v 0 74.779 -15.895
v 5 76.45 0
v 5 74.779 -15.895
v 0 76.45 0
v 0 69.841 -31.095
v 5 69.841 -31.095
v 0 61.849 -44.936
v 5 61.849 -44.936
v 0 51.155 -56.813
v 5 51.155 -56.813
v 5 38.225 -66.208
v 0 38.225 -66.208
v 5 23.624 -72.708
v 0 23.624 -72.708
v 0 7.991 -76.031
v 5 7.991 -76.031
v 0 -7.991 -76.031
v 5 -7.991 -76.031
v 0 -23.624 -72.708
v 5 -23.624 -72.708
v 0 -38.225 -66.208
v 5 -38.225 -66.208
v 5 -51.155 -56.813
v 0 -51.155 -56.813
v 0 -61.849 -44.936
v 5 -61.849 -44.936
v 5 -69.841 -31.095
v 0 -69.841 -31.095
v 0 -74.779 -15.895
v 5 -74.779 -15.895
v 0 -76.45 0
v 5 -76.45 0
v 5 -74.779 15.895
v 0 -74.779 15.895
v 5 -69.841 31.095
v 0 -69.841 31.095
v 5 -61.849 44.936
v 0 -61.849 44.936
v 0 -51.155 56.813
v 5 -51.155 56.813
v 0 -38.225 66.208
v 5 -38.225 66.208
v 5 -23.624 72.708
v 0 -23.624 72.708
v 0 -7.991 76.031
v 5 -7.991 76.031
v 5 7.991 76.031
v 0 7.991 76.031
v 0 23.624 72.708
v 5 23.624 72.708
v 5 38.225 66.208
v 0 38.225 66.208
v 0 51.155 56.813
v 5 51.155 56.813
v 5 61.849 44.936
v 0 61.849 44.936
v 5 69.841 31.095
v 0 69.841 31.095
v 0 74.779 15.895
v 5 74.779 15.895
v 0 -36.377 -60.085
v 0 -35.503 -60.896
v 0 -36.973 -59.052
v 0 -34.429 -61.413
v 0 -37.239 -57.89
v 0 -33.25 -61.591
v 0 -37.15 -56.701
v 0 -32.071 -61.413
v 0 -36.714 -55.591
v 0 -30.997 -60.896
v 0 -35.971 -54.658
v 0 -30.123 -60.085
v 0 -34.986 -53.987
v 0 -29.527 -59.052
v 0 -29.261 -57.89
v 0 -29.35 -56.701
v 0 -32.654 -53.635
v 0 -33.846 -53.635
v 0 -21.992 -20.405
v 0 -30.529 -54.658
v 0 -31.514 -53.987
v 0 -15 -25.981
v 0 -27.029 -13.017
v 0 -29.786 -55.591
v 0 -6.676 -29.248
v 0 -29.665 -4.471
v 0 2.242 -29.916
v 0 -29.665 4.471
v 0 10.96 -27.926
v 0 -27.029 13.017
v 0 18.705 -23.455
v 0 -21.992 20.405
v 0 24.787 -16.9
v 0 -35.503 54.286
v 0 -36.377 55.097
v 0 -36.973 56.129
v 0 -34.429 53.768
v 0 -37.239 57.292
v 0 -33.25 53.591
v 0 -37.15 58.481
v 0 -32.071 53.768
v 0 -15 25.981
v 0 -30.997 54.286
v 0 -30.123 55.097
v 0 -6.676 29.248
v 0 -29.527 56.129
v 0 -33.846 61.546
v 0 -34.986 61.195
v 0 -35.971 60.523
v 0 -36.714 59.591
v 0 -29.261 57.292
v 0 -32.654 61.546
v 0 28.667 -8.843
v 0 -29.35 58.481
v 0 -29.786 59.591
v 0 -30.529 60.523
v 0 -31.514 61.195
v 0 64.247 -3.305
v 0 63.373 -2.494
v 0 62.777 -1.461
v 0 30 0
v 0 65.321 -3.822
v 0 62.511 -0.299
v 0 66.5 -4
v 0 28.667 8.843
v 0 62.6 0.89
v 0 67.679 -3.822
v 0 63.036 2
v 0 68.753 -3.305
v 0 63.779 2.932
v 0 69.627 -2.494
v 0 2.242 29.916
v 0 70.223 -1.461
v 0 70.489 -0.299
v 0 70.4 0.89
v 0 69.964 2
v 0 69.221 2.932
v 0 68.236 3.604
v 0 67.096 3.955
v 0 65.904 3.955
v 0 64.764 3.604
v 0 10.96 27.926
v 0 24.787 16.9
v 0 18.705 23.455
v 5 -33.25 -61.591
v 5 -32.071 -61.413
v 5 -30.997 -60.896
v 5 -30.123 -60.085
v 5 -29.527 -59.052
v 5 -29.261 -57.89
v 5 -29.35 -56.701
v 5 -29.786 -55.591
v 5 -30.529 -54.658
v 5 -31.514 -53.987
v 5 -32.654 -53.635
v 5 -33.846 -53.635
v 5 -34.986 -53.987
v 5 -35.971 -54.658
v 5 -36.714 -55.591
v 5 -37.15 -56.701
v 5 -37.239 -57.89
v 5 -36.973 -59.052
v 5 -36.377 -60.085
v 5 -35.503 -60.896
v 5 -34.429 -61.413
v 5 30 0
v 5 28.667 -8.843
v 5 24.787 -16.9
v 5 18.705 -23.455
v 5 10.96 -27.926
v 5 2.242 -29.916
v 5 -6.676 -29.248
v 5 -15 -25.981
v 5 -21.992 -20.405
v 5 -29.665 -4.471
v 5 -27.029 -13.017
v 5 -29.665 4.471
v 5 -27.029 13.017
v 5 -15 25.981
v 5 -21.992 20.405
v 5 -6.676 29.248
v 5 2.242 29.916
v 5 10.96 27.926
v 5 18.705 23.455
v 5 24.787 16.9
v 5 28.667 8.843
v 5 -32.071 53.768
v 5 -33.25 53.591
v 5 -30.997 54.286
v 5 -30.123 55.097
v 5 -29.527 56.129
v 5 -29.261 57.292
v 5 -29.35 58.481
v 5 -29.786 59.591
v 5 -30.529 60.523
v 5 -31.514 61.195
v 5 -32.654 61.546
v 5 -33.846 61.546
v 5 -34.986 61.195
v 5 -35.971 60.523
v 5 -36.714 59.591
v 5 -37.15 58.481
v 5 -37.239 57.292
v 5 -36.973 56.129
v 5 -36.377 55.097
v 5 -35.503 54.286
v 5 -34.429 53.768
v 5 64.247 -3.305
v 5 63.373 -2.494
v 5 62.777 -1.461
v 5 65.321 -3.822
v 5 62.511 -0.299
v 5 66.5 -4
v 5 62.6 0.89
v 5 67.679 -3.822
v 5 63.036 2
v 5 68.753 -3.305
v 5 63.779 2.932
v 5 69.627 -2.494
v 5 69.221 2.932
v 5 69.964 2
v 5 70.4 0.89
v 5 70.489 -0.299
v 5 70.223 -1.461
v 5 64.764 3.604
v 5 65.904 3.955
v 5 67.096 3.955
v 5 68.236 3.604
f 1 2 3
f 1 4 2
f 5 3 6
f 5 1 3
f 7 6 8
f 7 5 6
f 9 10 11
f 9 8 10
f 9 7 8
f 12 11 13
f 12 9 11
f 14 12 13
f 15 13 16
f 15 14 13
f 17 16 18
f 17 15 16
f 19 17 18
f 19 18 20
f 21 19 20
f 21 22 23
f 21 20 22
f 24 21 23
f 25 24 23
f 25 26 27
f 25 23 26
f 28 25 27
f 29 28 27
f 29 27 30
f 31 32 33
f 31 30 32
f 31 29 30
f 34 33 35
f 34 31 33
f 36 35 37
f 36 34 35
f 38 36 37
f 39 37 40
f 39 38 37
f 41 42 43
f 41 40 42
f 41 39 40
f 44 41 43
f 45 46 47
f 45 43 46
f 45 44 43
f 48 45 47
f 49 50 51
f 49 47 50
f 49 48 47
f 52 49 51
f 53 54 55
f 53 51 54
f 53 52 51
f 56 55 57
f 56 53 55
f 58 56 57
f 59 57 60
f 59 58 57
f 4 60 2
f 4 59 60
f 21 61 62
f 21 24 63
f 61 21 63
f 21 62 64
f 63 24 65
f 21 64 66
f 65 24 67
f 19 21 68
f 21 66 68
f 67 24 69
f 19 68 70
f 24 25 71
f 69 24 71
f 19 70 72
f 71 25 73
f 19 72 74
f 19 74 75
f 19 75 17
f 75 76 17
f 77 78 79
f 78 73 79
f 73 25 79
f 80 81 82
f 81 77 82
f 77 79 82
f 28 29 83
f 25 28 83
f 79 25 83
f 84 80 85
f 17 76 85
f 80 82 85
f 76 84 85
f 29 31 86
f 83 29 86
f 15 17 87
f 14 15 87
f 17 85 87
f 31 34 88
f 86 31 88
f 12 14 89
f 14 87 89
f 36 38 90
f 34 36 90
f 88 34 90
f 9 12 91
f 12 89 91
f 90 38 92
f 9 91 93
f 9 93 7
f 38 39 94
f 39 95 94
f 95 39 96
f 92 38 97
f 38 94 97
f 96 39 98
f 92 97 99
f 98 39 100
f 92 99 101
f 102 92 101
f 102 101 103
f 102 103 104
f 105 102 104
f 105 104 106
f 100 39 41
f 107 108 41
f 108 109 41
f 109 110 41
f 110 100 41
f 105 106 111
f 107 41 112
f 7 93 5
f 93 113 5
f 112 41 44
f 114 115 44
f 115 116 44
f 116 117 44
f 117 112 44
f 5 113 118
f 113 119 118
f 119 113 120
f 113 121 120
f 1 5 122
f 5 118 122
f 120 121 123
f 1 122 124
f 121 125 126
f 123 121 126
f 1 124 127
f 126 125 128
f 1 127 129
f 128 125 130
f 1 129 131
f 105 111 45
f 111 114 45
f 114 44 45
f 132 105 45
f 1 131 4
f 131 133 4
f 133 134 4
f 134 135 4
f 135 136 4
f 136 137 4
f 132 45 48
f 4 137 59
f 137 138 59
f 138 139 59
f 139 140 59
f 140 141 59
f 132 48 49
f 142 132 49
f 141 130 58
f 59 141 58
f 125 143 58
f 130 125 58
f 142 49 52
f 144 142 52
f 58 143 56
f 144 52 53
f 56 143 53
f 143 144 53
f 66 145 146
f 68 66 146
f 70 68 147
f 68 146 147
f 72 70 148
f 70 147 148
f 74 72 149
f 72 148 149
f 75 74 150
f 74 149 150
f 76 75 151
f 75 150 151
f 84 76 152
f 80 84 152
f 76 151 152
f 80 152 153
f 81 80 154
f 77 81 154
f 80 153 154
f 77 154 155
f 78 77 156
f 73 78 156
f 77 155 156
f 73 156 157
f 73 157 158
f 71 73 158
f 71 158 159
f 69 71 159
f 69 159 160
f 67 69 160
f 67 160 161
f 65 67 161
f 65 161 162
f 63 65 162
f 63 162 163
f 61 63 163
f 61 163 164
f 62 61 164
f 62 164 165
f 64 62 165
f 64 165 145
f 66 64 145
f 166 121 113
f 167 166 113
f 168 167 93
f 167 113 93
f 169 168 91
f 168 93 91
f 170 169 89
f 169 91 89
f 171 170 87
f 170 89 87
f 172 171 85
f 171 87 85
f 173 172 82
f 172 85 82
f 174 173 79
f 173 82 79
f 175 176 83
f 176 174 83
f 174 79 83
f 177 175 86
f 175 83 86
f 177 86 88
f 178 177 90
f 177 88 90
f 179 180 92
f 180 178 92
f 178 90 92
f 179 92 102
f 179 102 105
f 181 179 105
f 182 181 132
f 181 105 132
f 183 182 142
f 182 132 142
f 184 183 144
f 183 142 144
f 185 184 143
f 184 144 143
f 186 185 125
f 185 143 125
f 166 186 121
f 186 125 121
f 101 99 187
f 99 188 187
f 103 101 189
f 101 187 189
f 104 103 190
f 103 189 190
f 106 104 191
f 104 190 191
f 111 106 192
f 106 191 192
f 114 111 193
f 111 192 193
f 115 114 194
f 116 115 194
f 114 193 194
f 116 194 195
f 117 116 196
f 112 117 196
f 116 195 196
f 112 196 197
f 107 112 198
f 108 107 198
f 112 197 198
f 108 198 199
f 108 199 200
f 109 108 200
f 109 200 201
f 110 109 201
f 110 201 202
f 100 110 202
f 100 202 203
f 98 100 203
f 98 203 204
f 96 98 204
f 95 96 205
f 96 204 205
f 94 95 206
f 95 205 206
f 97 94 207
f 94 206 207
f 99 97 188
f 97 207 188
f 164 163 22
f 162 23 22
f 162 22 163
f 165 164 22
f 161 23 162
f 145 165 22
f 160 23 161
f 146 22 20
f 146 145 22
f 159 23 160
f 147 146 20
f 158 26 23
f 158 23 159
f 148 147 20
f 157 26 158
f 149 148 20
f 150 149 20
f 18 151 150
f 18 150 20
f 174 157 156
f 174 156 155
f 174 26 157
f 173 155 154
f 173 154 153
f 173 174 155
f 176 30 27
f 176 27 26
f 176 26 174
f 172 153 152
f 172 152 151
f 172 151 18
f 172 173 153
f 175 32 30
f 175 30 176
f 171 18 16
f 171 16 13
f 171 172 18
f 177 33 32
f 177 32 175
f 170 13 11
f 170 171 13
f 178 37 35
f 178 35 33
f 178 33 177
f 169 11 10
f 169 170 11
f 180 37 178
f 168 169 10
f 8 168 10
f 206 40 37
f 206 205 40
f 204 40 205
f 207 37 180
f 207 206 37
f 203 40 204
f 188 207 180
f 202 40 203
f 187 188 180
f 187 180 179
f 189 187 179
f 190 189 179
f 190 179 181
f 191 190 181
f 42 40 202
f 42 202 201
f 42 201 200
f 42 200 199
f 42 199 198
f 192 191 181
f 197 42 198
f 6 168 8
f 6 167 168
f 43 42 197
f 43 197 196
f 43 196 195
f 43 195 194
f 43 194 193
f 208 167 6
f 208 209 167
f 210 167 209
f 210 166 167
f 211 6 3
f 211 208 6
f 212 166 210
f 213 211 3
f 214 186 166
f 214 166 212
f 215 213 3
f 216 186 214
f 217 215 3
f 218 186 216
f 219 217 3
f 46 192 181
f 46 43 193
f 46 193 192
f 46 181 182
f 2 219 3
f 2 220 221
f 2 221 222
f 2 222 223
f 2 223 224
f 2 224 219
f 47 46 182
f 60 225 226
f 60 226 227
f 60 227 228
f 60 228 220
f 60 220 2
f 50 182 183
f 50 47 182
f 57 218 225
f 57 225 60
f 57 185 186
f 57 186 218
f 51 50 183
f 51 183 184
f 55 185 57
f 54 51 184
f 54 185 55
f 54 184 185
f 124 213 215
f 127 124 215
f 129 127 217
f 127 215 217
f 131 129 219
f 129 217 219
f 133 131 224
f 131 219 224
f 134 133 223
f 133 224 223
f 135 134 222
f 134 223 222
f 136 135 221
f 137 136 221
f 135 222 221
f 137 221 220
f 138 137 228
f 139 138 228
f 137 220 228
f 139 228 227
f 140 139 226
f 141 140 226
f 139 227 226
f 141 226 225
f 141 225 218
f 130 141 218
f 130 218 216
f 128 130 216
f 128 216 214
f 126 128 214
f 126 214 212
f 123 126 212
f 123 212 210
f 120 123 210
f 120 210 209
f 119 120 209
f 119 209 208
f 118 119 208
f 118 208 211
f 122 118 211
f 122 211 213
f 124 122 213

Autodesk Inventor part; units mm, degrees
ref_plane "YZ Plane" through (0, 0, 0) normal (1, 0, 0) x (0, 1, 0)
ref_plane "XZ Plane" through (0, 0, 0) normal (0, 1, 0) x (-1, 0, 0)
ref_plane "XY Plane" through (0, 0, 0) normal (0, 0, 1) x (1, 0, 0)
sketch "Sketch1" plane through (0, 0, 0) normal (1, 0, 0) x (0, 1, 0)
  circle A0 centre (0, 0) radius 30
  circle A1 centre (0, 0) radius 76.45
  dimension "d11" = 152.9
  dimension "d12" = 60
extrude "Extrusion1" add sketch "Sketch1" along normal blind 5
sketch "Sketch3" plane through (5, 0, 0) normal (1, 0, 0) x (0, 0, -1)
  circle A0 centre (0, 0) radius 66.5
  circle A1 centre (0, 66.5) radius 4
  circle A2 centre (-57.5907, -33.25) radius 4
  circle A3 centre (57.5907, -33.25) radius 4
  dimension "d23" = 133
  dimension "d24" = 8
  dimension "d45" = 360
extrude "Extrusion4" cut sketch "Sketch3" against normal through all contours A1 A0 | A0 A1 | A3 A0 | A0 A3 | A2 A0 | A0 A2
thread "Thread1" size "M8x1.25" class "6H" standard "ANSI Metric M Profile" full length
thread "Thread5" size "M8x1.25" class "6H" standard "ANSI Metric M Profile" full length
thread "Thread6" size "M8x1.25" class "6H" standard "ANSI Metric M Profile" full length
properties part number "AsfaleiaDIpteroy"
